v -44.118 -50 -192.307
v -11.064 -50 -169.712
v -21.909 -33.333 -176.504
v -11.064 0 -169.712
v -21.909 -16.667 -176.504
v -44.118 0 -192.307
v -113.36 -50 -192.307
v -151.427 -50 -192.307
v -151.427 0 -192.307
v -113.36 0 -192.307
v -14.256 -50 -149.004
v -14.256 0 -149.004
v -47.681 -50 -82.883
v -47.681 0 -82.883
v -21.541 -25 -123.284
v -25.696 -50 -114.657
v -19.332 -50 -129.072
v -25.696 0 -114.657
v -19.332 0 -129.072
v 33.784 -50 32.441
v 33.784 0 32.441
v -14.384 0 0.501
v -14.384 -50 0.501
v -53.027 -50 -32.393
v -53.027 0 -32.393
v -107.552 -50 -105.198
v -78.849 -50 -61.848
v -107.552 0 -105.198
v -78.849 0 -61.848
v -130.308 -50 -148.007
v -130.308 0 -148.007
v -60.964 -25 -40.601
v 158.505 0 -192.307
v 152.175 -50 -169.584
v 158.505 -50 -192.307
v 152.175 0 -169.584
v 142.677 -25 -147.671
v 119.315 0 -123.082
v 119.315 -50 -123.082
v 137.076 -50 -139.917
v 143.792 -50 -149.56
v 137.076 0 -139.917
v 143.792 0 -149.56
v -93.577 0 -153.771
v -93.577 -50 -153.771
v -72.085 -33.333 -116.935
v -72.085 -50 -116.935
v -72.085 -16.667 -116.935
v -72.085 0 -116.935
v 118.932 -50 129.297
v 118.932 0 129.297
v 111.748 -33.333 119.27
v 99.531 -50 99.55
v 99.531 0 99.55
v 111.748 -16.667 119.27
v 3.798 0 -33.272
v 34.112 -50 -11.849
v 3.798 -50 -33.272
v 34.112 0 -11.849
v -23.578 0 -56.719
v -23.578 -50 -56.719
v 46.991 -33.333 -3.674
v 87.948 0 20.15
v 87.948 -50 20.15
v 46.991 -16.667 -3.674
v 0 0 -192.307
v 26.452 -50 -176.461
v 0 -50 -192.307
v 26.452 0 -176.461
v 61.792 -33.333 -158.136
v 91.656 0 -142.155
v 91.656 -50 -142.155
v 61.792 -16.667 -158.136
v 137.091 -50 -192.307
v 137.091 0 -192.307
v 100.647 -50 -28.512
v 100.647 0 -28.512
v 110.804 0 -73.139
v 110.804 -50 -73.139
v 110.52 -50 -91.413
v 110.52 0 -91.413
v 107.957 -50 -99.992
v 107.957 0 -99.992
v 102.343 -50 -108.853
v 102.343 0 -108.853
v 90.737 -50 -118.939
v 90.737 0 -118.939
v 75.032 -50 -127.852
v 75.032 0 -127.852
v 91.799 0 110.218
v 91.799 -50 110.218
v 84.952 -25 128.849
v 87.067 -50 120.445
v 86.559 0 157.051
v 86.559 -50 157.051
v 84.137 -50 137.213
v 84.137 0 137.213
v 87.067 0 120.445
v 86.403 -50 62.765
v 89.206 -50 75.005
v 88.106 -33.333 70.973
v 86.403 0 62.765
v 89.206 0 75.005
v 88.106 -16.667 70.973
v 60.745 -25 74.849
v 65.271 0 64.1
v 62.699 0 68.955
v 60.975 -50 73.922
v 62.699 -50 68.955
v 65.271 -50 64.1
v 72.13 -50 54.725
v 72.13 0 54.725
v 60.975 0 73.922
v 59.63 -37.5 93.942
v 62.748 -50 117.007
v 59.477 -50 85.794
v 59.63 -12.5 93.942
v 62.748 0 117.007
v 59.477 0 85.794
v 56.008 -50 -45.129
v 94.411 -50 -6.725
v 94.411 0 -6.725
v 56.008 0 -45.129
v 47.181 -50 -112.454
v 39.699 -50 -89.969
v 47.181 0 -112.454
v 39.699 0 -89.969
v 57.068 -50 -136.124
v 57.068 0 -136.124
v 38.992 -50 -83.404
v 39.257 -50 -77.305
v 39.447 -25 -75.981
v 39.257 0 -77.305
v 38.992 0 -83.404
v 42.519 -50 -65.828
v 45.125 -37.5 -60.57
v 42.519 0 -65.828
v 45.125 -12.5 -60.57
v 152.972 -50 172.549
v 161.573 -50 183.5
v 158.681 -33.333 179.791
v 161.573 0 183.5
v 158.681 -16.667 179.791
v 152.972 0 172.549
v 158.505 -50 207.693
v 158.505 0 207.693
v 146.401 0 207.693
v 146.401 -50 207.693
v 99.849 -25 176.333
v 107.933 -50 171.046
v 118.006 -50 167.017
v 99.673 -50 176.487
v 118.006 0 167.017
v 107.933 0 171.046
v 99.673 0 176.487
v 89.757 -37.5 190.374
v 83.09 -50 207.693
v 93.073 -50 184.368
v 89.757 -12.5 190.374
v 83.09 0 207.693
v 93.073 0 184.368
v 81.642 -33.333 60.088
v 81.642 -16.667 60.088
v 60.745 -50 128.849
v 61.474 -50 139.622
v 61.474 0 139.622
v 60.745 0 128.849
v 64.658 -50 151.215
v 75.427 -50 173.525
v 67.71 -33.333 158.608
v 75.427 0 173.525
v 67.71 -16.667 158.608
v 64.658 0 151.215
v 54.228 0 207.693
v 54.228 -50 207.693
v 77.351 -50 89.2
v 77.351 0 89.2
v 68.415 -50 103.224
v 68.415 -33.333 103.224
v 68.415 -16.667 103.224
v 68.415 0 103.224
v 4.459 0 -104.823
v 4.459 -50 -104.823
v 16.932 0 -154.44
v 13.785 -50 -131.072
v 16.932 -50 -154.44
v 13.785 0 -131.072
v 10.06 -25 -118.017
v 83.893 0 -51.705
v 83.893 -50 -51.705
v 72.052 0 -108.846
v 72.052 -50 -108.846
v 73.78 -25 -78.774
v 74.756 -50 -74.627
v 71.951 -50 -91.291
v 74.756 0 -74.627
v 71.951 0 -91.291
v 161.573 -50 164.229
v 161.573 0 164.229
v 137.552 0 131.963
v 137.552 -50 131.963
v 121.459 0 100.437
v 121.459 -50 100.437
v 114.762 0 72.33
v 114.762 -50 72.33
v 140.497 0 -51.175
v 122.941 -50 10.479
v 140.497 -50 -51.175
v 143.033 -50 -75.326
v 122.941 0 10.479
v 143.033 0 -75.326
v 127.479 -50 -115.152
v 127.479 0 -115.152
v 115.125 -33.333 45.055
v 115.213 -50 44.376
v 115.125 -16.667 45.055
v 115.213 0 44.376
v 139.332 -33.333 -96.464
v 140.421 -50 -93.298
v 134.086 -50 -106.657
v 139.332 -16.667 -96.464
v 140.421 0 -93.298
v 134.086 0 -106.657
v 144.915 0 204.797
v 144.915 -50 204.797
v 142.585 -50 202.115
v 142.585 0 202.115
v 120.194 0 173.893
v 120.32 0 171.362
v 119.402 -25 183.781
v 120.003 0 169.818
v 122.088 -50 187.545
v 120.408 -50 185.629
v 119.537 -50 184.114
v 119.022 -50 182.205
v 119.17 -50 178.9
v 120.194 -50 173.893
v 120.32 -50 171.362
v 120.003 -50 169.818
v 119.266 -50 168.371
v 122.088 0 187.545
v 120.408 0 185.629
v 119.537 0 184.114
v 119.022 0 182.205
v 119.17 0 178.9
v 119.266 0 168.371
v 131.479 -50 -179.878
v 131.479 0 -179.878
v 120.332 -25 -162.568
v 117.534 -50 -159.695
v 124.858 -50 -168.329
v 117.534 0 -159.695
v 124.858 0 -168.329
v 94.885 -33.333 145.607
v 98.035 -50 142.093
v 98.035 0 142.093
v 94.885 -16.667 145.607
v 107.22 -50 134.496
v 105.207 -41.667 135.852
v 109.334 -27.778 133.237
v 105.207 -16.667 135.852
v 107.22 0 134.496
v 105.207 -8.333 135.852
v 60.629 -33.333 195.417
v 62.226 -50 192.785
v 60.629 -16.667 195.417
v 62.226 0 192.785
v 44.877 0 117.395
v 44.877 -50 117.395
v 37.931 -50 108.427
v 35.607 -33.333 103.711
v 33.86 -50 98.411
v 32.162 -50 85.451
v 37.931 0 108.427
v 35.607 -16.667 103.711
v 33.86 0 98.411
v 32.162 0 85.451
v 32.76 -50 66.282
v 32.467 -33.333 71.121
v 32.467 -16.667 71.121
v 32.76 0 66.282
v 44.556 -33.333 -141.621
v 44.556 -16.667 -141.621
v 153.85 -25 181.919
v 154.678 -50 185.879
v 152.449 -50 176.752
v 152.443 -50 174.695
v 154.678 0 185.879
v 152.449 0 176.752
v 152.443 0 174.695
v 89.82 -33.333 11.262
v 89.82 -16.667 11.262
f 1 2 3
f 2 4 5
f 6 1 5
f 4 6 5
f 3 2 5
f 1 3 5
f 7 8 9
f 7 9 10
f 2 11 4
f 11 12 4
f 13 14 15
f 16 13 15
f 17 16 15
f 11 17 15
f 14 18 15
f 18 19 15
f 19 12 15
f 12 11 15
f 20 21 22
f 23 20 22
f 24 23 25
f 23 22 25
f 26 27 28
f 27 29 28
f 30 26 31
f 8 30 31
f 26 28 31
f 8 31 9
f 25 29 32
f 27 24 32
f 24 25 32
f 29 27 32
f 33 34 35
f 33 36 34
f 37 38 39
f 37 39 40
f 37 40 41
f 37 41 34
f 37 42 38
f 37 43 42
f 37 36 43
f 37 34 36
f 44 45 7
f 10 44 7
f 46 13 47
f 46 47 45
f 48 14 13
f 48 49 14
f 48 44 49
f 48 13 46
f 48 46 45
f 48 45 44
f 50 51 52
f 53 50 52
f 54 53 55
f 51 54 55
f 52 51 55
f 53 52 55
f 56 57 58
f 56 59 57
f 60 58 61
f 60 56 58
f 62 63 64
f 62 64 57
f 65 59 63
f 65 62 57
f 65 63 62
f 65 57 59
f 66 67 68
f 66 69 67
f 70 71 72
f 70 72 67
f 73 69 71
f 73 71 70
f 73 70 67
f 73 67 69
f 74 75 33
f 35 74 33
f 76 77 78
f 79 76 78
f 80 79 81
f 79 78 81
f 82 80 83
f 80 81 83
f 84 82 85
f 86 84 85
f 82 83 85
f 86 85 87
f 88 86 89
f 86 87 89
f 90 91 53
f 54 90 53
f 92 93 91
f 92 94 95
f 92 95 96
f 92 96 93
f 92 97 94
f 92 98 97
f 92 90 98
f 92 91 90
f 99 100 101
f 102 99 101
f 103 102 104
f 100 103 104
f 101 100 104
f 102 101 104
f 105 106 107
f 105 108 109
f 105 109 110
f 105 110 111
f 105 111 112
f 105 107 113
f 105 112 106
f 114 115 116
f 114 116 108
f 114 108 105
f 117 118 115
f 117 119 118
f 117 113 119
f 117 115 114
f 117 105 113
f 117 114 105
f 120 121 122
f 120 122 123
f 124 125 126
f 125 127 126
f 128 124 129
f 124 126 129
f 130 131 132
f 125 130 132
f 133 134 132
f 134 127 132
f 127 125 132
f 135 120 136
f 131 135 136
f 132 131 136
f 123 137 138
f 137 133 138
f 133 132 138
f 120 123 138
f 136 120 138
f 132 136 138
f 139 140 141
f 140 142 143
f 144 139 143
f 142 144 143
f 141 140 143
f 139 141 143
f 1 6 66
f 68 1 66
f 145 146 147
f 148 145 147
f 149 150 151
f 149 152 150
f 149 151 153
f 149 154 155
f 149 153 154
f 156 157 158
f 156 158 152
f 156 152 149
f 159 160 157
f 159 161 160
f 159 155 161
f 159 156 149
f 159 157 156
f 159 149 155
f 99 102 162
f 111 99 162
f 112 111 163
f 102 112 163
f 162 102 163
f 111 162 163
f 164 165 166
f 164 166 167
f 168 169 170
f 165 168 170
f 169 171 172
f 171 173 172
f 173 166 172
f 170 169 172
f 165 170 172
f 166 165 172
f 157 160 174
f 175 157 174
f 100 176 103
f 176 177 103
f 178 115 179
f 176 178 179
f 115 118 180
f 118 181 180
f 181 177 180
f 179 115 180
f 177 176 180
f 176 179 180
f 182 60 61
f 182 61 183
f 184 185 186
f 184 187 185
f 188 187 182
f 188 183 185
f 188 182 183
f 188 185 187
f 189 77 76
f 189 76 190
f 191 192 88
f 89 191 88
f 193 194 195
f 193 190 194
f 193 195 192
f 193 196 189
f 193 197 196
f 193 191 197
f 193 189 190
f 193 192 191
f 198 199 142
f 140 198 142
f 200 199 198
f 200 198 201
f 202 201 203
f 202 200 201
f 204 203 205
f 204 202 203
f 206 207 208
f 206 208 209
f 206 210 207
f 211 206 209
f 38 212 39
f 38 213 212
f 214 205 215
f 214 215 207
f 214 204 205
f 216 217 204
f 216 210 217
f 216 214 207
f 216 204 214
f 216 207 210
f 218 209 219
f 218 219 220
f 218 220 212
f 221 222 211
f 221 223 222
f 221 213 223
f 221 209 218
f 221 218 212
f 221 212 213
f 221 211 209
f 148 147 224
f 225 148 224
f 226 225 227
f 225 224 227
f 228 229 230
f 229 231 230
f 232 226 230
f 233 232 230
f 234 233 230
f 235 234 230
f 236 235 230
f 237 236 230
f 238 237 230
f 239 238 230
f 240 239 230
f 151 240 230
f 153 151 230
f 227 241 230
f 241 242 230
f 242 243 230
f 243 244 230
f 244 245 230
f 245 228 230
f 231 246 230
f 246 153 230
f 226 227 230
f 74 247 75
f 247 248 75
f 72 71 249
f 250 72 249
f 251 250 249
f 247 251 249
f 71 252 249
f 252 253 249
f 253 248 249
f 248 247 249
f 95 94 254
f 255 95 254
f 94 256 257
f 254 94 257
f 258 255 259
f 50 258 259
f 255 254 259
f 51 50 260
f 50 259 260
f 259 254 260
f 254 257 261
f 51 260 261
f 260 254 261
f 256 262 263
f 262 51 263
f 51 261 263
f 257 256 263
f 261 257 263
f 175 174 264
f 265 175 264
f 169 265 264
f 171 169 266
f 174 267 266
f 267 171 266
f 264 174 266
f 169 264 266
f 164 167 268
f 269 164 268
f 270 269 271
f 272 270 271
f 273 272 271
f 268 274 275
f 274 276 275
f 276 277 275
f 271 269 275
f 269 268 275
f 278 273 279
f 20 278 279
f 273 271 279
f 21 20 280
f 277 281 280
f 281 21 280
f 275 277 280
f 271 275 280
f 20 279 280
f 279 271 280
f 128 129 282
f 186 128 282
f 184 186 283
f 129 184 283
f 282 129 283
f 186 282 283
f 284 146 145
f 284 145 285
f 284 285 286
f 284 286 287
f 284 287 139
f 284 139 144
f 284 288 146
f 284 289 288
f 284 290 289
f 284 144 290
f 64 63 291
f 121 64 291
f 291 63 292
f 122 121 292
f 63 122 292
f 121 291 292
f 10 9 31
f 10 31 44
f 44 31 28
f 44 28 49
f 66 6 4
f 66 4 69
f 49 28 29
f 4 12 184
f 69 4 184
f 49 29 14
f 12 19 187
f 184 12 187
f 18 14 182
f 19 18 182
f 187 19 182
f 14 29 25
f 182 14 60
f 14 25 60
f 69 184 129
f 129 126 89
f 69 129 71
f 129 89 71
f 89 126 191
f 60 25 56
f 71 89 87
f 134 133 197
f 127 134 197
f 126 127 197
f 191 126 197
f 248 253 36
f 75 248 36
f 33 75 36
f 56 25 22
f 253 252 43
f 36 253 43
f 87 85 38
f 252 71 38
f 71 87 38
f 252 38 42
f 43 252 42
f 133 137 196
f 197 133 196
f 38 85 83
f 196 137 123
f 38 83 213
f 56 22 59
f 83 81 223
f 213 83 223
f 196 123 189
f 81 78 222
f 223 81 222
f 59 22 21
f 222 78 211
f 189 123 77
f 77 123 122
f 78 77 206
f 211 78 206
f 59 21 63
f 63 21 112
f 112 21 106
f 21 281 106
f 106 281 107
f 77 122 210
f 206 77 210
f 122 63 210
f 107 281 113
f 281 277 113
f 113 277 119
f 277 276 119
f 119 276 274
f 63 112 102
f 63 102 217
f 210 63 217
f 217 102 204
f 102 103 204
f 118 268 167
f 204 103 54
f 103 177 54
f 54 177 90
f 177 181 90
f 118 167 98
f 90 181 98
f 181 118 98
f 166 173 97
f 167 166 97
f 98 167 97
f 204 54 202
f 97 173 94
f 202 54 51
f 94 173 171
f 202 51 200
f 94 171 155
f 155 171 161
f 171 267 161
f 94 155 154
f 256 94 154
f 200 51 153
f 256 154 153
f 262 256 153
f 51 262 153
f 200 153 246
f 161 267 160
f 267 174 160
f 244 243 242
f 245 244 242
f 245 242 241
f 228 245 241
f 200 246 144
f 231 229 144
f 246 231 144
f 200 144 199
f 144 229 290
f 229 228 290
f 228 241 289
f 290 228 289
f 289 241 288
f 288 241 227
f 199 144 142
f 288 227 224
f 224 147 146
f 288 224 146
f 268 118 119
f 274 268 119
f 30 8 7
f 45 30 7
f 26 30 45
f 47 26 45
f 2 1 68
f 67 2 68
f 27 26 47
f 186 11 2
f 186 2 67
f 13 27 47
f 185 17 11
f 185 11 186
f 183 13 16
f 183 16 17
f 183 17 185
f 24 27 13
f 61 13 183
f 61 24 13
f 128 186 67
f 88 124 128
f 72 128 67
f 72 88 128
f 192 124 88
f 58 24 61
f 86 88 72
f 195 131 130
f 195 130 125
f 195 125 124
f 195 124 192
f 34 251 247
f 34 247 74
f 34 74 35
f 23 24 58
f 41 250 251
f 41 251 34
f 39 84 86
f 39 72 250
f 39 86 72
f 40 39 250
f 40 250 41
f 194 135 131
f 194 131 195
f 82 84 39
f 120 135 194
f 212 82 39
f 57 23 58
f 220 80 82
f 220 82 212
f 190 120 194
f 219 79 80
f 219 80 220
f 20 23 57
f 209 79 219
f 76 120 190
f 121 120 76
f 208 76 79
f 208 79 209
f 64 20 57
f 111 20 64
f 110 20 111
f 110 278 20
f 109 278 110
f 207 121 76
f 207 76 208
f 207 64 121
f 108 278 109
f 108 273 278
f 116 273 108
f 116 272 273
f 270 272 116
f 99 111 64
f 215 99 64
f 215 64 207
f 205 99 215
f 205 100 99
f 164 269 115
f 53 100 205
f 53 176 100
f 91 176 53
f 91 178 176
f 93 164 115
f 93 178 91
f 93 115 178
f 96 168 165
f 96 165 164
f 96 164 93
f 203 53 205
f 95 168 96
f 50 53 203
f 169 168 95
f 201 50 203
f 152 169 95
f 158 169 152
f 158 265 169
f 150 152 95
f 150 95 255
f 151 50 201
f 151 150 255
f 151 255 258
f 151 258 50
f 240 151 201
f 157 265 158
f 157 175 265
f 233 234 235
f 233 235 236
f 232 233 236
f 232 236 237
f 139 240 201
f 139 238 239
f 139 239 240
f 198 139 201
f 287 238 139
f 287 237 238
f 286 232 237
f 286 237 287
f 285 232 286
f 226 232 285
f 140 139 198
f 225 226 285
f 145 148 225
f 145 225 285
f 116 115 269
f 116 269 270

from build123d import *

# Parameters (mm, degrees)
F1_DEPTH = 50


with BuildPart() as f1:
    # F0 (on Front) → F1 (new body)
    with BuildSketch(Plane.XZ):
        with BuildLine():
            add(Edge.make_bspline(
                [(33.7840405817, 32.4410954859), (-1.3350670747, 11.1961369565), (-82.9727851373, -45.9388415897), (-125.8274168712, -137.6125319097), (-151.4273277136, -192.3071747745)],
                knots=[0.1650923147, 0.1650923147, 0.1650923147, 0.1650923147, 0.5023647043, 1, 1, 1, 1], degree=3))
            Line((-151.4273277136, -192.3071747745), (-113.3603453636, -192.3071747745))
            add(Edge.make_bspline(
                [(-47.6813485904, -82.8825103726), (-73.9418191046, -115.1830009143), (-94.0292507398, -153.2818472534), (-113.3603453636, -192.3071747745)],
                knots=[0.5680635842, 0.5680635842, 0.5680635842, 0.5680635842, 1, 1, 1, 1], degree=3))
            add(Edge.make_bspline(
                [(-23.5778673601, -56.7194873224), (-27.8845088808, -60.8451196614), (-36.1979815182, -69.3017688301), (-43.9455530092, -78.2874659017), (-47.6813485904, -82.8825103726)],
                knots=[0.44475387, 0.44475387, 0.44475387, 0.44475387, 0.5066166215, 0.5680635842, 0.5680635842, 0.5680635842, 0.5680635842], degree=3))
            add(Edge.make_bspline(
                [(87.9483139372, 20.1501727821), (45.3698576212, -3.4429156349), (7.3841483298, -27.0588126184), (-23.5778673601, -56.7194873224)],
                knots=[0, 0, 0, 0, 0.44475387, 0.44475387, 0.44475387, 0.44475387], degree=3))
            add(Edge.make_bspline(
                [(86.4029882629, 62.7652361886), (85.449929096, 56.9509946506), (84.4401796439, 43.3835035509), (86.3354202415, 28.6006214532), (87.9483139372, 20.1501727821)],
                knots=[0.2898066076, 0.2898066076, 0.2898066076, 0.2898066076, 0.3311800495, 0.3836336632, 0.3836336632, 0.3836336632, 0.3836336632], degree=3))
            add(Edge.make_bspline(
                [(86.4029882629, 62.7652361886), (81.6406325524, 60.0877235039), (76.8798373396, 57.4106422817), (72.1301305263, 54.7253465386)],
                knots=[0, 0, 0, 0, 0.0443569986, 0.0443569986, 0.0443569986, 0.0443569986], degree=3))
            add(Edge.make_bspline(
                [(72.1301305263, 54.7253465386), (59.2019033995, 47.4162399695), (46.35582734, 40.0462741519), (33.7840405817, 32.4410954859)],
                knots=[0.0443569986, 0.0443569986, 0.0443569986, 0.0443569986, 0.1650923147, 0.1650923147, 0.1650923147, 0.1650923147], degree=3))
        make_face()
        with BuildLine():
            add(Edge.make_bspline(
                [(-47.6813485904, -82.8825103726), (-37.6976178586, -95.8078145278), (-17.6570022581, -121.6548352785), (-13.2867608742, -153.7004230944), (-11.0641516952, -169.7119861588)],
                knots=[0, 0, 0, 0, 0.5013709336, 1, 1, 1, 1], degree=3))
            add(Edge.make_bspline(
                [(16.9321630542, -154.4396487608), (7.9475731058, -158.9016267331), (-1.4242642684, -163.9163277691), (-11.0641516952, -169.7119861588)],
                knots=[0.8987923644, 0.8987923644, 0.8987923644, 0.8987923644, 0.9466643403, 0.9466643403, 0.9466643403, 0.9466643403], degree=3))
            add(Edge.make_bspline(
                [(-23.5778673601, -56.7194873224), (-10.048506017, -78.2254081232), (13.3855203997, -115.4324178206), (15.8758483062, -142.8745703905), (16.9321630542, -154.4396487608)],
                knots=[0, 0, 0, 0, 0.5786754475, 1, 1, 1, 1], degree=3))
            add(Edge.make_bspline(
                [(-23.5778673601, -56.7194873224), (-27.8845088808, -60.8451196614), (-36.1979815182, -69.3017688301), (-43.9455530092, -78.2874659017), (-47.6813485904, -82.8825103726)],
                knots=[0.44475387, 0.44475387, 0.44475387, 0.44475387, 0.5066166215, 0.5680635842, 0.5680635842, 0.5680635842, 0.5680635842], degree=3))
        make_face()
        with BuildLine():
            Line((161.5726722864, 164.2289310694), (161.5726722864, 183.500433121))
            add(Edge.make_bspline(
                [(161.5726722864, 183.500433121), (158.6697561937, 179.7603709259), (155.7997051715, 176.1136274949), (152.9720624863, 172.5488397796)],
                knots=[0, 0, 0, 0, 0.0227975426, 0.0227975426, 0.0227975426, 0.0227975426], degree=3))
            add(Edge.make_bspline(
                [(152.9720624863, 172.5488397796), (149.5266021616, 168.2051740458), (146.144106472, 163.9831898515), (142.8418403639, 159.8623300408)],
                knots=[0.0227975426, 0.0227975426, 0.0227975426, 0.0227975426, 0.0505761686, 0.0505761686, 0.0505761686, 0.0505761686], degree=3))
            add(Edge.make_bspline(
                [(142.8418403639, 159.8623300408), (134.2230298354, 149.1070157325), (126.1507380473, 139.0405542113), (118.931917396, 129.2974610904)],
                knots=[0.0505761686, 0.0505761686, 0.0505761686, 0.0505761686, 0.1230775075, 0.1230775075, 0.1230775075, 0.1230775075], degree=3))
            add(Edge.make_bspline(
                [(118.931917396, 129.2974610904), (111.4275135493, 119.1689222297), (104.8454447873, 109.3898433661), (99.5305536728, 99.5496247644)],
                knots=[0.1230775075, 0.1230775075, 0.1230775075, 0.1230775075, 0.1984470661, 0.1984470661, 0.1984470661, 0.1984470661], degree=3))
            add(Edge.make_bspline(
                [(99.5305536728, 99.5496247644), (95.1743477908, 91.4843573429), (91.6694084315, 83.3780173754), (89.2056084764, 75.0045255924)],
                knots=[0.1984470661, 0.1984470661, 0.1984470661, 0.1984470661, 0.260221674, 0.260221674, 0.260221674, 0.260221674], degree=3))
            add(Edge.make_bspline(
                [(89.2056084764, 75.0045255924), (88.0256518483, 70.9943148164), (87.0844928908, 66.9228296031), (86.4029882629, 62.7652361886)],
                knots=[0.260221674, 0.260221674, 0.260221674, 0.260221674, 0.2898066076, 0.2898066076, 0.2898066076, 0.2898066076], degree=3))
            add(Edge.make_bspline(
                [(86.4029882629, 62.7652361886), (85.449929096, 56.9509946506), (84.4401796439, 43.3835035509), (86.3354202415, 28.6006214532), (87.9483139372, 20.1501727821)],
                knots=[0.2898066076, 0.2898066076, 0.2898066076, 0.2898066076, 0.3311800495, 0.3836336632, 0.3836336632, 0.3836336632, 0.3836336632], degree=3))
            add(Edge.make_bspline(
                [(87.9483139372, 20.1501727821), (89.6334036756, 11.3214667244), (91.9225091752, 2.2895818916), (94.4113235468, -6.7245809888)],
                knots=[0.3836336632, 0.3836336632, 0.3836336632, 0.3836336632, 0.4384351956, 0.4384351956, 0.4384351956, 0.4384351956], degree=3))
            add(Edge.make_bspline(
                [(94.4113235468, -6.7245809888), (96.4305537515, -14.0379709171), (98.5812410463, -21.3396954834), (100.6474662993, -28.5117831797)],
                knots=[0.4384351956, 0.4384351956, 0.4384351956, 0.4384351956, 0.4828968922, 0.4828968922, 0.4828968922, 0.4828968922], degree=3))
            add(Edge.make_bspline(
                [(100.6474662993, -28.5117831797), (108.2301787006, -54.8321847135), (119.9469648226, -99.5063533785), (92.6369226658, -119.1415299059), (75.0321073118, -127.8520125935)],
                knots=[0.4828968922, 0.4828968922, 0.4828968922, 0.4828968922, 0.6460641257, 0.7795199626, 0.7795199626, 0.7795199626, 0.7795199626], degree=3))
            add(Edge.make_bspline(
                [(75.0321073118, -127.8520125935), (69.5360042843, -130.5713657539), (63.5216279141, -133.2786604033), (57.0675570237, -136.1243560803)],
                knots=[0.7795199626, 0.7795199626, 0.7795199626, 0.7795199626, 0.8211839627, 0.8211839627, 0.8211839627, 0.8211839627], degree=3))
            add(Edge.make_bspline(
                [(57.0675570237, -136.1243560803), (45.045424625, -141.4250927436), (31.4976714177, -147.2060434603), (16.9321630542, -154.4396487608)],
                knots=[0.8211839627, 0.8211839627, 0.8211839627, 0.8211839627, 0.8987923644, 0.8987923644, 0.8987923644, 0.8987923644], degree=3))
            add(Edge.make_bspline(
                [(16.9321630542, -154.4396487608), (7.9475731058, -158.9016267331), (-1.4242642684, -163.9163277691), (-11.0641516952, -169.7119861588)],
                knots=[0.8987923644, 0.8987923644, 0.8987923644, 0.8987923644, 0.9466643403, 0.9466643403, 0.9466643403, 0.9466643403], degree=3))
            add(Edge.make_bspline(
                [(-11.0641516952, -169.7119861588), (-21.8042505923, -176.1691097249), (-32.877076864, -183.5956264599), (-44.1177855636, -192.3071747745)],
                knots=[0.9466643403, 0.9466643403, 0.9466643403, 0.9466643403, 1, 1, 1, 1], degree=3))
            Line((-44.1177855636, -192.3071747745), (0, -192.3071747745))
            add(Edge.make_bspline(
                [(91.6558492517, -142.1554952409), (63.5808744263, -158.4654974972), (28.6929657416, -173.0898848198), (0, -192.3071747745)],
                knots=[0.8011074852, 0.8011074852, 0.8011074852, 0.8011074852, 1, 1, 1, 1], degree=3))
            add(Edge.make_bspline(
                [(119.3154431729, -123.0815035944), (111.4612420038, -129.8801116218), (102.0230483979, -136.1327279003), (91.6558492517, -142.1554952409)],
                knots=[0.7276627779, 0.7276627779, 0.7276627779, 0.7276627779, 0.8011074852, 0.8011074852, 0.8011074852, 0.8011074852], degree=3))
            add(Edge.make_bspline(
                [(161.5726722864, 164.2289310694), (127.9283165879, 123.741138071), (90.0243038422, 52.1079771624), (162.5005260377, -72.9909762919), (128.5067292283, -115.1255129324), (119.3154431729, -123.0815035944)],
                knots=[0, 0, 0, 0, 0.3115903654, 0.6417149775, 0.7276627779, 0.7276627779, 0.7276627779, 0.7276627779], degree=3))
        make_face()
        with BuildLine():
            add(Edge.make_bspline(
                [(119.3154431729, -123.0815035944), (127.8271004026, -130.229203514), (146.5347439848, -145.9824570753), (154.2952784291, -176.0164611644), (158.504858613, -192.3071747745)],
                knots=[0, 0, 0, 0, 0.4583695956, 1, 1, 1, 1], degree=3))
            add(Edge.make_bspline(
                [(119.3154431729, -123.0815035944), (111.4612420038, -129.8801116218), (102.0230483979, -136.1327279003), (91.6558492517, -142.1554952409)],
                knots=[0.7276627779, 0.7276627779, 0.7276627779, 0.7276627779, 0.8011074852, 0.8011074852, 0.8011074852, 0.8011074852], degree=3))
            add(Edge.make_bspline(
                [(91.6558492517, -142.1554952409), (102.2562480915, -148.266180717), (123.0818131064, -159.961158959), (132.4458816607, -181.5720975488), (137.090831995, -192.3071747745)],
                knots=[0, 0, 0, 0, 0.5038335041, 1, 1, 1, 1], degree=3))
            Line((137.090831995, -192.3071747745), (158.504858613, -192.3071747745))
        make_face()
        with BuildLine():
            add(Edge.make_bspline(
                [(94.4113235468, -6.7245809888), (96.4305537515, -14.0379709171), (98.5812410463, -21.3396954834), (100.6474662993, -28.5117831797)],
                knots=[0.4384351956, 0.4384351956, 0.4384351956, 0.4384351956, 0.4828968922, 0.4828968922, 0.4828968922, 0.4828968922], degree=3))
            add(Edge.make_bspline(
                [(94.4113235468, -6.7245809888), (69.8929498645, -30.0484086542), (20.7095259404, -72.3808334135), (49.418452744, -114.6003239541), (57.0675570237, -136.1243560803)],
                knots=[0, 0, 0, 0, 0.5429128164, 1, 1, 1, 1], degree=3))
            add(Edge.make_bspline(
                [(75.0321073118, -127.8520125935), (69.5360042843, -130.5713657539), (63.5216279141, -133.2786604033), (57.0675570237, -136.1243560803)],
                knots=[0.7795199626, 0.7795199626, 0.7795199626, 0.7795199626, 0.8211839627, 0.8211839627, 0.8211839627, 0.8211839627], degree=3))
            add(Edge.make_bspline(
                [(100.6474662993, -28.5117831797), (85.276066462, -45.5253793732), (69.9269817684, -77.6031695274), (71.0284103415, -109.5876994667), (75.0321073118, -127.8520125935)],
                knots=[0, 0, 0, 0, 0.5186390985, 1, 1, 1, 1], degree=3))
        make_face()
        with BuildLine():
            add(Edge.make_bspline(
                [(60.7451200485, 128.8491934538), (60.921887229, 124.9463354687), (61.6026617993, 120.996224136), (62.7479620056, 117.0065256713)],
                knots=[0.4677213645, 0.4677213645, 0.4677213645, 0.4677213645, 0.588178468, 0.588178468, 0.588178468, 0.588178468], degree=3))
            add(Edge.make_bspline(
                [(60.7451200485, 128.8491934538), (48.2162620465, 122.1917617815), (31.5432081965, 105.5782023832), (31.9272311169, 71.1430044589), (34.5814806954, 43.8973117153), (33.7840405817, 32.4410954859)],
                knots=[0, 0, 0, 0, 0.3329948055, 0.6525577446, 1, 1, 1, 1], degree=3))
            add(Edge.make_bspline(
                [(72.1301305263, 54.7253465386), (59.2019033995, 47.4162399695), (46.35582734, 40.0462741519), (33.7840405817, 32.4410954859)],
                knots=[0.0443569986, 0.0443569986, 0.0443569986, 0.0443569986, 0.1650923147, 0.1650923147, 0.1650923147, 0.1650923147], degree=3))
            add(Edge.make_bspline(
                [(62.7479620056, 117.0065256713), (59.6024302783, 101.0624498763), (57.2427035001, 73.977040262), (66.555671879, 61.7784809906), (72.1301305263, 54.7253465386)],
                knots=[0, 0, 0, 0, 0.5746656103, 1, 1, 1, 1], degree=3))
        make_face()
        with BuildLine():
            add(Edge.make_bspline(
                [(75.4271748481, 173.5246273106), (77.3752720663, 170.7812263834), (81.134719612, 165.4233111741), (84.7614654199, 159.7675420119), (86.5594399231, 157.0506042409)],
                knots=[0.3943758085, 0.3943758085, 0.3943758085, 0.3943758085, 0.4949279004, 0.5888141141, 0.5888141141, 0.5888141141, 0.5888141141], degree=3))
            add(Edge.make_bspline(
                [(75.4271748481, 173.5246273106), (66.9712117374, 158.4454793727), (60.0587529981, 144.0035513846), (60.7451200485, 128.8491934538)],
                knots=[0, 0, 0, 0, 0.4677213645, 0.4677213645, 0.4677213645, 0.4677213645], degree=3))
            add(Edge.make_bspline(
                [(60.7451200485, 128.8491934538), (60.921887229, 124.9463354687), (61.6026617993, 120.996224136), (62.7479620056, 117.0065256713)],
                knots=[0.4677213645, 0.4677213645, 0.4677213645, 0.4677213645, 0.588178468, 0.588178468, 0.588178468, 0.588178468], degree=3))
            add(Edge.make_bspline(
                [(62.7479620056, 117.0065256713), (66.6635408444, 103.3664522692), (76.0086586492, 89.2636705474), (89.2056084764, 75.0045255924)],
                knots=[0.588178468, 0.588178468, 0.588178468, 0.588178468, 1, 1, 1, 1], degree=3))
            add(Edge.make_bspline(
                [(99.5305536728, 99.5496247644), (95.1743477908, 91.4843573429), (91.6694084315, 83.3780173754), (89.2056084764, 75.0045255924)],
                knots=[0.1984470661, 0.1984470661, 0.1984470661, 0.1984470661, 0.260221674, 0.260221674, 0.260221674, 0.260221674], degree=3))
            add(Edge.make_bspline(
                [(86.5594399231, 157.0506042409), (83.9878015469, 147.0462299724), (82.836579489, 127.8427234548), (90.6243055451, 109.9335235527), (99.5305536728, 99.5496247644)],
                knots=[0, 0, 0, 0, 0.4816112661, 1, 1, 1, 1], degree=3))
        make_face()
        with BuildLine():
            add(Edge.make_bspline(
                [(83.0902010202, 207.6928252255), (87.110088997, 195.8396449748), (93.5872758475, 177.0872799999), (110.8460810758, 169.3792962525), (118.0063178545, 167.0171113404)],
                knots=[0, 0, 0, 0, 0.4677504063, 0.7294986849, 0.7294986849, 0.7294986849, 0.7294986849], degree=3))
            Line((83.0902010202, 207.6928252255), (54.227810353, 207.6928252255))
            add(Edge.make_bspline(
                [(54.227810353, 207.6928252255), (60.0854175021, 194.6229659864), (67.7865340514, 184.2845323351), (75.4271748481, 173.5246273106)],
                knots=[0, 0, 0, 0, 0.3943758085, 0.3943758085, 0.3943758085, 0.3943758085], degree=3))
            add(Edge.make_bspline(
                [(75.4271748481, 173.5246273106), (77.3752720663, 170.7812263834), (81.134719612, 165.4233111741), (84.7614654199, 159.7675420119), (86.5594399231, 157.0506042409)],
                knots=[0.3943758085, 0.3943758085, 0.3943758085, 0.3943758085, 0.4949279004, 0.5888141141, 0.5888141141, 0.5888141141, 0.5888141141], degree=3))
            add(Edge.make_bspline(
                [(86.5594399231, 157.0506042409), (94.3573639982, 145.2670809389), (103.0350172008, 133.7468834117), (118.931917396, 129.2974610904)],
                knots=[0.5888141141, 0.5888141141, 0.5888141141, 0.5888141141, 0.9960042969, 0.9960042969, 0.9960042969, 0.9960042969], degree=3))
            add(Edge.make_bspline(
                [(142.8418403639, 159.8623300408), (134.2230298354, 149.1070157325), (126.1507380473, 139.0405542113), (118.931917396, 129.2974610904)],
                knots=[0.0505761686, 0.0505761686, 0.0505761686, 0.0505761686, 0.1230775075, 0.1230775075, 0.1230775075, 0.1230775075], degree=3))
            add(Edge.make_bspline(
                [(118.0063178545, 167.0171113404), (125.4059977095, 164.5759333951), (133.8391586431, 162.5656756814), (142.8418403639, 159.8623300408)],
                knots=[0.7294986849, 0.7294986849, 0.7294986849, 0.7294986849, 1, 1, 1, 1], degree=3))
        make_face()
        with BuildLine():
            add(Edge.make_bspline(
                [(158.504858613, 207.6928252255), (155.8710665844, 197.6334981347), (155.1200926152, 181.8258093222), (151.6002153146, 176.3836793356), (152.9720624863, 172.5488397796)],
                knots=[0, 0, 0, 0, 0.625221571, 1, 1, 1, 1], degree=3))
            Line((158.504858613, 207.6928252255), (146.4012861252, 207.6928252255))
            add(Edge.make_bspline(
                [(146.4012861252, 207.6928252255), (143.1155545876, 197.7078282598), (108.3076436448, 187.9302668709), (123.4952842004, 171.6174236455), (118.0063178545, 167.0171113404)],
                knots=[0, 0, 0, 0, 0.5941954131, 1, 1, 1, 1], degree=3))
            add(Edge.make_bspline(
                [(118.0063178545, 167.0171113404), (125.4059977095, 164.5759333951), (133.8391586431, 162.5656756814), (142.8418403639, 159.8623300408)],
                knots=[0.7294986849, 0.7294986849, 0.7294986849, 0.7294986849, 1, 1, 1, 1], degree=3))
            add(Edge.make_bspline(
                [(152.9720624863, 172.5488397796), (149.5266021616, 168.2051740458), (146.144106472, 163.9831898515), (142.8418403639, 159.8623300408)],
                knots=[0.0227975426, 0.0227975426, 0.0227975426, 0.0227975426, 0.0505761686, 0.0505761686, 0.0505761686, 0.0505761686], degree=3))
        make_face()
    extrude(amount=F1_DEPTH)


solid = f1.part
